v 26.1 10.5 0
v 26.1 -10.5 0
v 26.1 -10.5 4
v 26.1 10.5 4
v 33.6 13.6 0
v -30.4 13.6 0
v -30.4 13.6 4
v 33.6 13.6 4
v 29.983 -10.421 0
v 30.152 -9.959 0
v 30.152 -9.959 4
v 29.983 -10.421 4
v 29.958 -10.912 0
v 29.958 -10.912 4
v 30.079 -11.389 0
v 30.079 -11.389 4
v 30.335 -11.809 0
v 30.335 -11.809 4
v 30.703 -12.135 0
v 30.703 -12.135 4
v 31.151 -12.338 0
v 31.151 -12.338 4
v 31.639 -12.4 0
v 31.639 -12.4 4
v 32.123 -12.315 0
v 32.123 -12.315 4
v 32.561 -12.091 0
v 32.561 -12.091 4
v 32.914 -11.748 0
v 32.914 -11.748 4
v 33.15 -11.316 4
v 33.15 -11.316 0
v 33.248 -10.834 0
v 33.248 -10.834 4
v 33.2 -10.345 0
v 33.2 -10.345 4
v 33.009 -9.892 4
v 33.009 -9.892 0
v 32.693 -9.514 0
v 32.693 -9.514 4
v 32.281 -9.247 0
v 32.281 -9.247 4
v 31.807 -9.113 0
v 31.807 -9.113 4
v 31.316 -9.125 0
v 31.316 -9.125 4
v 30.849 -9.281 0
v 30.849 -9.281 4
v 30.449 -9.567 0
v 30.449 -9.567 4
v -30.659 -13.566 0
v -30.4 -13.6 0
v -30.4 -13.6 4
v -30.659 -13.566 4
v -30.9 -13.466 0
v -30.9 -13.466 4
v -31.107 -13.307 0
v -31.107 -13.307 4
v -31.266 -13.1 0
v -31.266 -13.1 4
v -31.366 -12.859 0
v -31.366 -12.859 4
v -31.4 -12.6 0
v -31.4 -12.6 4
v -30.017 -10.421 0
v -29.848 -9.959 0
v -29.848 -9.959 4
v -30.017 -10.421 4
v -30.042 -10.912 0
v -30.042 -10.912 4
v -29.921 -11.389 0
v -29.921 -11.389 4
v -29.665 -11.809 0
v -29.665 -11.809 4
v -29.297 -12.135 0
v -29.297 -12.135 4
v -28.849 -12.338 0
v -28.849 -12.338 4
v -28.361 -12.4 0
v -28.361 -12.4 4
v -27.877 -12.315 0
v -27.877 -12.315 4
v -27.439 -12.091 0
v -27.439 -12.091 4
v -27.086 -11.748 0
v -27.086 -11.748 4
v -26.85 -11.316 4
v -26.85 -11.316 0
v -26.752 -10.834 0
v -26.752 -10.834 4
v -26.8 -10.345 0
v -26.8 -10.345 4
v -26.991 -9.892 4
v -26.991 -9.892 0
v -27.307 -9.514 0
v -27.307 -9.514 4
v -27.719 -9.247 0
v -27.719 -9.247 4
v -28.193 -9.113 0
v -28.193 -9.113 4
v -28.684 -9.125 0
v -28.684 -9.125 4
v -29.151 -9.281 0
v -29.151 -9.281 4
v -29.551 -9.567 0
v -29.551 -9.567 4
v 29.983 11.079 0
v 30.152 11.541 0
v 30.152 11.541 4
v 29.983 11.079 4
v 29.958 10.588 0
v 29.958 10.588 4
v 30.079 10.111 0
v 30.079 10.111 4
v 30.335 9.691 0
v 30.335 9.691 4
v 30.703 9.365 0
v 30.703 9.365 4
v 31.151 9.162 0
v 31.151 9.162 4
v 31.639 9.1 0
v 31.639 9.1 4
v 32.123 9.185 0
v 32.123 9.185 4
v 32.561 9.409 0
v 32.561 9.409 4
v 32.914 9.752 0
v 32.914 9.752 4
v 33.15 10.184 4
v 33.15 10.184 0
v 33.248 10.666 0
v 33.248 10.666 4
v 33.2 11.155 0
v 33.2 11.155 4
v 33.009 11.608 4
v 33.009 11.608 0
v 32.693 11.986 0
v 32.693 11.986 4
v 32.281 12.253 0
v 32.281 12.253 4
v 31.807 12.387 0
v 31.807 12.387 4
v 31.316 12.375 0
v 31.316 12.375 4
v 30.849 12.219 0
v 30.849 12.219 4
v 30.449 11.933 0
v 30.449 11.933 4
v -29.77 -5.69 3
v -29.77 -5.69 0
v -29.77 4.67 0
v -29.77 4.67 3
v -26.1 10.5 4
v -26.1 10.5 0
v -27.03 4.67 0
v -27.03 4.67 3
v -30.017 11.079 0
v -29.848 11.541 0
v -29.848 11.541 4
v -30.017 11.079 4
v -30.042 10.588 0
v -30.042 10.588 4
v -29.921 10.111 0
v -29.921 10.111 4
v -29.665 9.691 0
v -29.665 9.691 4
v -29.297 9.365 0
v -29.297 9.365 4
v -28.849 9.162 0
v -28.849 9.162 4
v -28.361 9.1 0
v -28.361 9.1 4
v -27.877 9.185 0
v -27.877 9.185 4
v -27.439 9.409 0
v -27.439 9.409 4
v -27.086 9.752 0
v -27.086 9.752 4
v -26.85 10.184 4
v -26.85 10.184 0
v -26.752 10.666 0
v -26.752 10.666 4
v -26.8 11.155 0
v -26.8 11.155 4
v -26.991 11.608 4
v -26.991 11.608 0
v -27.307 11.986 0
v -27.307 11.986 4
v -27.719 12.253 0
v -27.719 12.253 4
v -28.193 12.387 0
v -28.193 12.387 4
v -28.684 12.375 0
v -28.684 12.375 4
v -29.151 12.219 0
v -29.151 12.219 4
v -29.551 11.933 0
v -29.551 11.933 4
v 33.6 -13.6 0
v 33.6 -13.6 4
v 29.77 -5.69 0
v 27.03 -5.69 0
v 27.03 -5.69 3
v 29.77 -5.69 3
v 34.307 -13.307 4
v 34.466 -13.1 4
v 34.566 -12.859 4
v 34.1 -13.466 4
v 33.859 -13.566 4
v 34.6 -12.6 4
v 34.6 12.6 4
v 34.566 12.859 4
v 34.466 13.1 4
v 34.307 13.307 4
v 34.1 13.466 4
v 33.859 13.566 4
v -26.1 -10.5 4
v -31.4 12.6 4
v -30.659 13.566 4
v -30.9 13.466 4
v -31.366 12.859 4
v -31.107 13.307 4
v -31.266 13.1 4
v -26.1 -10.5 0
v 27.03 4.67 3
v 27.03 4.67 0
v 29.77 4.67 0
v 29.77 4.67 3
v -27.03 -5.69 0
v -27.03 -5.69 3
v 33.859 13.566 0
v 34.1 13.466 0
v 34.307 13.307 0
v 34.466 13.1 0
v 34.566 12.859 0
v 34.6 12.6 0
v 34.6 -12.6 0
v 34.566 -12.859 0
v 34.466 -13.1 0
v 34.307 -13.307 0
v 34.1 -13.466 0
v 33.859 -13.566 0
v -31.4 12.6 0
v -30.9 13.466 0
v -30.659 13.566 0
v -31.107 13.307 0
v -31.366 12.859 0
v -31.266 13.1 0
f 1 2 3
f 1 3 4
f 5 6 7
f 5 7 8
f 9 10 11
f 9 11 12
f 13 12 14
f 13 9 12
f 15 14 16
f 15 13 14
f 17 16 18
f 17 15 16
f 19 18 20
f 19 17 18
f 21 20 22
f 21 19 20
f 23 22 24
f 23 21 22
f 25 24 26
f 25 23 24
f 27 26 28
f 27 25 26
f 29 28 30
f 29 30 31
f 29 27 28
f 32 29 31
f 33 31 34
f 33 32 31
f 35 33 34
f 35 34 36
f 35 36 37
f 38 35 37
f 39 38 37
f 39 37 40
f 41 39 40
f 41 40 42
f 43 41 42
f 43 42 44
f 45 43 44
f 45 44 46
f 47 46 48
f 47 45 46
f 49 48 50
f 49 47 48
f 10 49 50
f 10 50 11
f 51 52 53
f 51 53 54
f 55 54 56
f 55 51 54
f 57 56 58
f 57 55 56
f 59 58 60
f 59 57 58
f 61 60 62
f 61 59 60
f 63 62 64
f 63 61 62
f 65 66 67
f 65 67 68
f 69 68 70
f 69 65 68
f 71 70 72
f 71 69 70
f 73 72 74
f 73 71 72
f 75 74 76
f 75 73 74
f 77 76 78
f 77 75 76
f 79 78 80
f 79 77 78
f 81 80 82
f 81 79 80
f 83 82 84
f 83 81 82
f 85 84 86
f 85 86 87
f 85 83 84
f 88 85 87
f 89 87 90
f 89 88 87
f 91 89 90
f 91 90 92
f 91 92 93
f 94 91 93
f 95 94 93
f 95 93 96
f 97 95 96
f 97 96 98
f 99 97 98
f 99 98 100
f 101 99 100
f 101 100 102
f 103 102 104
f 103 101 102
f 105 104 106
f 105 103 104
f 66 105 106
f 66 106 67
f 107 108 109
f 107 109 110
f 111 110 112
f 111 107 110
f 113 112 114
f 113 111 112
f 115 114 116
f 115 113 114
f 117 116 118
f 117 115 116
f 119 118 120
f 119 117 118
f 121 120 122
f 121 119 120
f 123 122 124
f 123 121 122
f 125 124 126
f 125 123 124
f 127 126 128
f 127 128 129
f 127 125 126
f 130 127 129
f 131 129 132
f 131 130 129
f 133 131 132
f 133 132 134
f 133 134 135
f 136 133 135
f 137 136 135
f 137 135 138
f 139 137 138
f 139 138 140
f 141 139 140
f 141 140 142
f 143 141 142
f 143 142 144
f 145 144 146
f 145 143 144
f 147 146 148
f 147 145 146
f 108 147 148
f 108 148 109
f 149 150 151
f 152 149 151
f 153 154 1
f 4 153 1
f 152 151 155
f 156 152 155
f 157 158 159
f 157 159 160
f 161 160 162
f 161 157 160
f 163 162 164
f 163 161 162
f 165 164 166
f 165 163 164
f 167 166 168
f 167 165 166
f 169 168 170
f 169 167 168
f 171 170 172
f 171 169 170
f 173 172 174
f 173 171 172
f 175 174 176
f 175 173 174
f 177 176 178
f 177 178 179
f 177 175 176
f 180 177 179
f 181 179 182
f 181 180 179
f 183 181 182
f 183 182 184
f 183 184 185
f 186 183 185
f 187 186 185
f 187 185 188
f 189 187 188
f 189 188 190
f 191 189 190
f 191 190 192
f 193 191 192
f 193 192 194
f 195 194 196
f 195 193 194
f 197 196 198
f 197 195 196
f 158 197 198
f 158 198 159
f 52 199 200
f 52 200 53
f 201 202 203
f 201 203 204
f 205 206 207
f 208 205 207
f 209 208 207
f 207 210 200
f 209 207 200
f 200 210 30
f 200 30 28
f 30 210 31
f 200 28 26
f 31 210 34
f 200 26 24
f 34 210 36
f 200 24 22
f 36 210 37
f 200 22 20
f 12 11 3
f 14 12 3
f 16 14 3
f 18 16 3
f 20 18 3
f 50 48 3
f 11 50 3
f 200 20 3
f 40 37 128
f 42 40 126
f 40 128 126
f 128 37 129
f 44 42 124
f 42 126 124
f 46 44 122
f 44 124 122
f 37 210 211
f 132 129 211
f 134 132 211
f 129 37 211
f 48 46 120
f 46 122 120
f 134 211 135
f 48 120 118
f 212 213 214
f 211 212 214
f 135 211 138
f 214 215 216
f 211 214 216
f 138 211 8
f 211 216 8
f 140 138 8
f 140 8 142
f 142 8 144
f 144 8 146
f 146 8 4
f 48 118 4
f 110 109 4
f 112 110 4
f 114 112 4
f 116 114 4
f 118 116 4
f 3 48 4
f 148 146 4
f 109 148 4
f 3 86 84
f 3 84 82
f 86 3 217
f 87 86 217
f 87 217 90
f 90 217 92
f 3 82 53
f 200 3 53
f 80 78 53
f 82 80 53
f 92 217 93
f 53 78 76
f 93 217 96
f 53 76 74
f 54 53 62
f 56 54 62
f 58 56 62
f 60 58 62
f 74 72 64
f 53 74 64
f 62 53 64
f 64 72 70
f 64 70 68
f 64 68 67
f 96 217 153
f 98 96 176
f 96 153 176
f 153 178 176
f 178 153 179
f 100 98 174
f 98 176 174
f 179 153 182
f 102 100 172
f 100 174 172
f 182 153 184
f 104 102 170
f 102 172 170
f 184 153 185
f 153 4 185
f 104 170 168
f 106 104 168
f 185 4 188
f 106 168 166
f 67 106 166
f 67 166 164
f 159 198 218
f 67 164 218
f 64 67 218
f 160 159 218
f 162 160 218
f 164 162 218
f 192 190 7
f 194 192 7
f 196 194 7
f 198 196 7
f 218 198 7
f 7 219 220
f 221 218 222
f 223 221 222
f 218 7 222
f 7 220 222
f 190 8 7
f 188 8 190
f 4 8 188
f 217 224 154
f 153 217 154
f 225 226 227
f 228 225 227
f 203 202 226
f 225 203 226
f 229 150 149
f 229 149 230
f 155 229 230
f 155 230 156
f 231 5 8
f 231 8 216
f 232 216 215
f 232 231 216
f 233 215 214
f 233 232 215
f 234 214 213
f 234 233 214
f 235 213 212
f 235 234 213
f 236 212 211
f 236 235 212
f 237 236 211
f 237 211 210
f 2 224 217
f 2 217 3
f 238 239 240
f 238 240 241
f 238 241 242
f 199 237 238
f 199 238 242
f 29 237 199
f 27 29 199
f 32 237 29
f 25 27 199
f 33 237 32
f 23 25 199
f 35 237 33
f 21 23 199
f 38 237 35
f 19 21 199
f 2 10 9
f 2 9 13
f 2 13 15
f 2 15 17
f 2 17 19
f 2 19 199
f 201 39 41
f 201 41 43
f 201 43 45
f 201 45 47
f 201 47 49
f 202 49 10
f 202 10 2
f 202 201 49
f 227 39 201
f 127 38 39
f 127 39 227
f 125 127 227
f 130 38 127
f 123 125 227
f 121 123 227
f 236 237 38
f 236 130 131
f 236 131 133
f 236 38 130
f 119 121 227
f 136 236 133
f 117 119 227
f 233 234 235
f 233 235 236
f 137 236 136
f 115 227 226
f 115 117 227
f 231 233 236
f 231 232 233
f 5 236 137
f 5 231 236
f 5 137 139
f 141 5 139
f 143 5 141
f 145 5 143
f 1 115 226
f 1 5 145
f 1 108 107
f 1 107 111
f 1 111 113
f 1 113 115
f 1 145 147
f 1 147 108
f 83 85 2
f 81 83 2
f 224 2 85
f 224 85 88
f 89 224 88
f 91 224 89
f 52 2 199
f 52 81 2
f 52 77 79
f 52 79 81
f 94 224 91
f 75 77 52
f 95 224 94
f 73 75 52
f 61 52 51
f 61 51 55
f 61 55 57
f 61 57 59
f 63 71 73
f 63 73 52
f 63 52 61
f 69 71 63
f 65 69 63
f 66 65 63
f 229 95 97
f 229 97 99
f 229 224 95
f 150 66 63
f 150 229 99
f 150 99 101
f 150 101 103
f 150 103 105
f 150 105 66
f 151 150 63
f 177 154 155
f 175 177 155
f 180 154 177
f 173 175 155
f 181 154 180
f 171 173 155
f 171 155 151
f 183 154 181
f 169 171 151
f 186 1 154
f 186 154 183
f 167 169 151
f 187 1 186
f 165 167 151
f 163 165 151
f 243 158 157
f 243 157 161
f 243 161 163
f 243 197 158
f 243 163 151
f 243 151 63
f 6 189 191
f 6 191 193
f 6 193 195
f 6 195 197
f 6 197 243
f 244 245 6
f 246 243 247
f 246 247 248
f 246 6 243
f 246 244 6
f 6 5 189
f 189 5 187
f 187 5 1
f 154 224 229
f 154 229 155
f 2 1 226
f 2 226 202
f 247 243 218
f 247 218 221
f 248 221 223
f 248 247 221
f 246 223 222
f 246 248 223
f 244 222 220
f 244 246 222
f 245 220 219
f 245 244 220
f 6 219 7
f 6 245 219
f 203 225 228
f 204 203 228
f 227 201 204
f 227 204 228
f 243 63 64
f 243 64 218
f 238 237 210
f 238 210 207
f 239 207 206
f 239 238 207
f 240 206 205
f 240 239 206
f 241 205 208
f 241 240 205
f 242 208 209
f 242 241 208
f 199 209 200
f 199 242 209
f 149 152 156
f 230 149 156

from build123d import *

# Parameters (mm, degrees)
SKETCH2_W           = 52.2
SKETCH2_H           = 21
SKETCH2_W_2         = 2.74
SKETCH2_H_2         = 10.36
BOSS_EXTRUDE1_DEPTH = 4
SKETCH2_3_W         = 2.74
SKETCH2_3_H         = 10.36
CUT_EXTRUDE1_DEPTH  = 3


with BuildPart() as part:
    # Sketch2 → Boss-Extrude1 (new body)
    # profile 1 of 3: a face of its own
    with BuildSketch(Plane.XY):
        with BuildLine():
            Line((34.6, 12.6), (34.6, -12.6))
            ThreePointArc((34.6, -12.6), (34.307106781, -13.307106781), (33.6, -13.6))
            Line((33.6, -13.6), (-30.4, -13.6))
            ThreePointArc((-30.4, -13.6), (-31.107106781, -13.307106781), (-31.4, -12.6))
            Line((-31.4, -12.6), (-31.4, 12.6))
            ThreePointArc((-31.4, 12.6), (-31.107106781, 13.307106781), (-30.4, 13.6))
            Line((-30.4, 13.6), (33.6, 13.6))
            ThreePointArc((33.6, 13.6), (34.307106781, 13.307106781), (34.6, 12.6))
        make_face()
        with BuildLine():
            ThreePointArc((-26.951988773, 9.958947861), (-27.608947861, 12.198011227), (-29.848011227, 11.541052139))
            ThreePointArc((-29.848011227, 11.541052139), (-29.191052139, 9.301988773), (-26.951988773, 9.958947861))
        make_face(mode=Mode.SUBTRACT)
        with BuildLine():
            ThreePointArc((-26.951988773, -11.541052139), (-27.608947861, -9.301988773), (-29.848011227, -9.958947861))
            ThreePointArc((-29.848011227, -9.958947861), (-29.191052139, -12.198011227), (-26.951988773, -11.541052139))
        make_face(mode=Mode.SUBTRACT)
        with BuildLine():
            ThreePointArc((33.048011227, -11.541052139), (32.391052139, -9.301988773), (30.151988773, -9.958947861))
            ThreePointArc((30.151988773, -9.958947861), (30.808947861, -12.198011227), (33.048011227, -11.541052139))
        make_face(mode=Mode.SUBTRACT)
        with BuildLine():
            ThreePointArc((33.048011227, 9.958947861), (32.391052139, 12.198011227), (30.151988773, 11.541052139))
            ThreePointArc((30.151988773, 11.541052139), (30.808947861, 9.301988773), (33.048011227, 9.958947861))
        make_face(mode=Mode.SUBTRACT)
        Rectangle(SKETCH2_W, SKETCH2_H, mode=Mode.SUBTRACT)
    # profile 2 of 3: a face of its own
    with BuildSketch(Plane.XY):
        with Locations((-28.4, -0.51)):
            Rectangle(SKETCH2_W_2, SKETCH2_H_2)
    # profile 3 of 3: a face of its own
    with BuildSketch(Plane.XY):
        with Locations((28.4, -0.51)):
            Rectangle(SKETCH2_W_2, SKETCH2_H_2)
    extrude(amount=BOSS_EXTRUDE1_DEPTH)

    # Sketch2<3> → Cut-Extrude1 (cut)
    with BuildSketch(Plane.XY):
        with Locations((-28.4, -0.51)):
            Rectangle(SKETCH2_3_W, SKETCH2_3_H)
        with Locations((28.4, -0.51)):
            Rectangle(SKETCH2_3_W, SKETCH2_3_H)
    extrude(amount=CUT_EXTRUDE1_DEPTH, mode=Mode.SUBTRACT)


solid = part.part
